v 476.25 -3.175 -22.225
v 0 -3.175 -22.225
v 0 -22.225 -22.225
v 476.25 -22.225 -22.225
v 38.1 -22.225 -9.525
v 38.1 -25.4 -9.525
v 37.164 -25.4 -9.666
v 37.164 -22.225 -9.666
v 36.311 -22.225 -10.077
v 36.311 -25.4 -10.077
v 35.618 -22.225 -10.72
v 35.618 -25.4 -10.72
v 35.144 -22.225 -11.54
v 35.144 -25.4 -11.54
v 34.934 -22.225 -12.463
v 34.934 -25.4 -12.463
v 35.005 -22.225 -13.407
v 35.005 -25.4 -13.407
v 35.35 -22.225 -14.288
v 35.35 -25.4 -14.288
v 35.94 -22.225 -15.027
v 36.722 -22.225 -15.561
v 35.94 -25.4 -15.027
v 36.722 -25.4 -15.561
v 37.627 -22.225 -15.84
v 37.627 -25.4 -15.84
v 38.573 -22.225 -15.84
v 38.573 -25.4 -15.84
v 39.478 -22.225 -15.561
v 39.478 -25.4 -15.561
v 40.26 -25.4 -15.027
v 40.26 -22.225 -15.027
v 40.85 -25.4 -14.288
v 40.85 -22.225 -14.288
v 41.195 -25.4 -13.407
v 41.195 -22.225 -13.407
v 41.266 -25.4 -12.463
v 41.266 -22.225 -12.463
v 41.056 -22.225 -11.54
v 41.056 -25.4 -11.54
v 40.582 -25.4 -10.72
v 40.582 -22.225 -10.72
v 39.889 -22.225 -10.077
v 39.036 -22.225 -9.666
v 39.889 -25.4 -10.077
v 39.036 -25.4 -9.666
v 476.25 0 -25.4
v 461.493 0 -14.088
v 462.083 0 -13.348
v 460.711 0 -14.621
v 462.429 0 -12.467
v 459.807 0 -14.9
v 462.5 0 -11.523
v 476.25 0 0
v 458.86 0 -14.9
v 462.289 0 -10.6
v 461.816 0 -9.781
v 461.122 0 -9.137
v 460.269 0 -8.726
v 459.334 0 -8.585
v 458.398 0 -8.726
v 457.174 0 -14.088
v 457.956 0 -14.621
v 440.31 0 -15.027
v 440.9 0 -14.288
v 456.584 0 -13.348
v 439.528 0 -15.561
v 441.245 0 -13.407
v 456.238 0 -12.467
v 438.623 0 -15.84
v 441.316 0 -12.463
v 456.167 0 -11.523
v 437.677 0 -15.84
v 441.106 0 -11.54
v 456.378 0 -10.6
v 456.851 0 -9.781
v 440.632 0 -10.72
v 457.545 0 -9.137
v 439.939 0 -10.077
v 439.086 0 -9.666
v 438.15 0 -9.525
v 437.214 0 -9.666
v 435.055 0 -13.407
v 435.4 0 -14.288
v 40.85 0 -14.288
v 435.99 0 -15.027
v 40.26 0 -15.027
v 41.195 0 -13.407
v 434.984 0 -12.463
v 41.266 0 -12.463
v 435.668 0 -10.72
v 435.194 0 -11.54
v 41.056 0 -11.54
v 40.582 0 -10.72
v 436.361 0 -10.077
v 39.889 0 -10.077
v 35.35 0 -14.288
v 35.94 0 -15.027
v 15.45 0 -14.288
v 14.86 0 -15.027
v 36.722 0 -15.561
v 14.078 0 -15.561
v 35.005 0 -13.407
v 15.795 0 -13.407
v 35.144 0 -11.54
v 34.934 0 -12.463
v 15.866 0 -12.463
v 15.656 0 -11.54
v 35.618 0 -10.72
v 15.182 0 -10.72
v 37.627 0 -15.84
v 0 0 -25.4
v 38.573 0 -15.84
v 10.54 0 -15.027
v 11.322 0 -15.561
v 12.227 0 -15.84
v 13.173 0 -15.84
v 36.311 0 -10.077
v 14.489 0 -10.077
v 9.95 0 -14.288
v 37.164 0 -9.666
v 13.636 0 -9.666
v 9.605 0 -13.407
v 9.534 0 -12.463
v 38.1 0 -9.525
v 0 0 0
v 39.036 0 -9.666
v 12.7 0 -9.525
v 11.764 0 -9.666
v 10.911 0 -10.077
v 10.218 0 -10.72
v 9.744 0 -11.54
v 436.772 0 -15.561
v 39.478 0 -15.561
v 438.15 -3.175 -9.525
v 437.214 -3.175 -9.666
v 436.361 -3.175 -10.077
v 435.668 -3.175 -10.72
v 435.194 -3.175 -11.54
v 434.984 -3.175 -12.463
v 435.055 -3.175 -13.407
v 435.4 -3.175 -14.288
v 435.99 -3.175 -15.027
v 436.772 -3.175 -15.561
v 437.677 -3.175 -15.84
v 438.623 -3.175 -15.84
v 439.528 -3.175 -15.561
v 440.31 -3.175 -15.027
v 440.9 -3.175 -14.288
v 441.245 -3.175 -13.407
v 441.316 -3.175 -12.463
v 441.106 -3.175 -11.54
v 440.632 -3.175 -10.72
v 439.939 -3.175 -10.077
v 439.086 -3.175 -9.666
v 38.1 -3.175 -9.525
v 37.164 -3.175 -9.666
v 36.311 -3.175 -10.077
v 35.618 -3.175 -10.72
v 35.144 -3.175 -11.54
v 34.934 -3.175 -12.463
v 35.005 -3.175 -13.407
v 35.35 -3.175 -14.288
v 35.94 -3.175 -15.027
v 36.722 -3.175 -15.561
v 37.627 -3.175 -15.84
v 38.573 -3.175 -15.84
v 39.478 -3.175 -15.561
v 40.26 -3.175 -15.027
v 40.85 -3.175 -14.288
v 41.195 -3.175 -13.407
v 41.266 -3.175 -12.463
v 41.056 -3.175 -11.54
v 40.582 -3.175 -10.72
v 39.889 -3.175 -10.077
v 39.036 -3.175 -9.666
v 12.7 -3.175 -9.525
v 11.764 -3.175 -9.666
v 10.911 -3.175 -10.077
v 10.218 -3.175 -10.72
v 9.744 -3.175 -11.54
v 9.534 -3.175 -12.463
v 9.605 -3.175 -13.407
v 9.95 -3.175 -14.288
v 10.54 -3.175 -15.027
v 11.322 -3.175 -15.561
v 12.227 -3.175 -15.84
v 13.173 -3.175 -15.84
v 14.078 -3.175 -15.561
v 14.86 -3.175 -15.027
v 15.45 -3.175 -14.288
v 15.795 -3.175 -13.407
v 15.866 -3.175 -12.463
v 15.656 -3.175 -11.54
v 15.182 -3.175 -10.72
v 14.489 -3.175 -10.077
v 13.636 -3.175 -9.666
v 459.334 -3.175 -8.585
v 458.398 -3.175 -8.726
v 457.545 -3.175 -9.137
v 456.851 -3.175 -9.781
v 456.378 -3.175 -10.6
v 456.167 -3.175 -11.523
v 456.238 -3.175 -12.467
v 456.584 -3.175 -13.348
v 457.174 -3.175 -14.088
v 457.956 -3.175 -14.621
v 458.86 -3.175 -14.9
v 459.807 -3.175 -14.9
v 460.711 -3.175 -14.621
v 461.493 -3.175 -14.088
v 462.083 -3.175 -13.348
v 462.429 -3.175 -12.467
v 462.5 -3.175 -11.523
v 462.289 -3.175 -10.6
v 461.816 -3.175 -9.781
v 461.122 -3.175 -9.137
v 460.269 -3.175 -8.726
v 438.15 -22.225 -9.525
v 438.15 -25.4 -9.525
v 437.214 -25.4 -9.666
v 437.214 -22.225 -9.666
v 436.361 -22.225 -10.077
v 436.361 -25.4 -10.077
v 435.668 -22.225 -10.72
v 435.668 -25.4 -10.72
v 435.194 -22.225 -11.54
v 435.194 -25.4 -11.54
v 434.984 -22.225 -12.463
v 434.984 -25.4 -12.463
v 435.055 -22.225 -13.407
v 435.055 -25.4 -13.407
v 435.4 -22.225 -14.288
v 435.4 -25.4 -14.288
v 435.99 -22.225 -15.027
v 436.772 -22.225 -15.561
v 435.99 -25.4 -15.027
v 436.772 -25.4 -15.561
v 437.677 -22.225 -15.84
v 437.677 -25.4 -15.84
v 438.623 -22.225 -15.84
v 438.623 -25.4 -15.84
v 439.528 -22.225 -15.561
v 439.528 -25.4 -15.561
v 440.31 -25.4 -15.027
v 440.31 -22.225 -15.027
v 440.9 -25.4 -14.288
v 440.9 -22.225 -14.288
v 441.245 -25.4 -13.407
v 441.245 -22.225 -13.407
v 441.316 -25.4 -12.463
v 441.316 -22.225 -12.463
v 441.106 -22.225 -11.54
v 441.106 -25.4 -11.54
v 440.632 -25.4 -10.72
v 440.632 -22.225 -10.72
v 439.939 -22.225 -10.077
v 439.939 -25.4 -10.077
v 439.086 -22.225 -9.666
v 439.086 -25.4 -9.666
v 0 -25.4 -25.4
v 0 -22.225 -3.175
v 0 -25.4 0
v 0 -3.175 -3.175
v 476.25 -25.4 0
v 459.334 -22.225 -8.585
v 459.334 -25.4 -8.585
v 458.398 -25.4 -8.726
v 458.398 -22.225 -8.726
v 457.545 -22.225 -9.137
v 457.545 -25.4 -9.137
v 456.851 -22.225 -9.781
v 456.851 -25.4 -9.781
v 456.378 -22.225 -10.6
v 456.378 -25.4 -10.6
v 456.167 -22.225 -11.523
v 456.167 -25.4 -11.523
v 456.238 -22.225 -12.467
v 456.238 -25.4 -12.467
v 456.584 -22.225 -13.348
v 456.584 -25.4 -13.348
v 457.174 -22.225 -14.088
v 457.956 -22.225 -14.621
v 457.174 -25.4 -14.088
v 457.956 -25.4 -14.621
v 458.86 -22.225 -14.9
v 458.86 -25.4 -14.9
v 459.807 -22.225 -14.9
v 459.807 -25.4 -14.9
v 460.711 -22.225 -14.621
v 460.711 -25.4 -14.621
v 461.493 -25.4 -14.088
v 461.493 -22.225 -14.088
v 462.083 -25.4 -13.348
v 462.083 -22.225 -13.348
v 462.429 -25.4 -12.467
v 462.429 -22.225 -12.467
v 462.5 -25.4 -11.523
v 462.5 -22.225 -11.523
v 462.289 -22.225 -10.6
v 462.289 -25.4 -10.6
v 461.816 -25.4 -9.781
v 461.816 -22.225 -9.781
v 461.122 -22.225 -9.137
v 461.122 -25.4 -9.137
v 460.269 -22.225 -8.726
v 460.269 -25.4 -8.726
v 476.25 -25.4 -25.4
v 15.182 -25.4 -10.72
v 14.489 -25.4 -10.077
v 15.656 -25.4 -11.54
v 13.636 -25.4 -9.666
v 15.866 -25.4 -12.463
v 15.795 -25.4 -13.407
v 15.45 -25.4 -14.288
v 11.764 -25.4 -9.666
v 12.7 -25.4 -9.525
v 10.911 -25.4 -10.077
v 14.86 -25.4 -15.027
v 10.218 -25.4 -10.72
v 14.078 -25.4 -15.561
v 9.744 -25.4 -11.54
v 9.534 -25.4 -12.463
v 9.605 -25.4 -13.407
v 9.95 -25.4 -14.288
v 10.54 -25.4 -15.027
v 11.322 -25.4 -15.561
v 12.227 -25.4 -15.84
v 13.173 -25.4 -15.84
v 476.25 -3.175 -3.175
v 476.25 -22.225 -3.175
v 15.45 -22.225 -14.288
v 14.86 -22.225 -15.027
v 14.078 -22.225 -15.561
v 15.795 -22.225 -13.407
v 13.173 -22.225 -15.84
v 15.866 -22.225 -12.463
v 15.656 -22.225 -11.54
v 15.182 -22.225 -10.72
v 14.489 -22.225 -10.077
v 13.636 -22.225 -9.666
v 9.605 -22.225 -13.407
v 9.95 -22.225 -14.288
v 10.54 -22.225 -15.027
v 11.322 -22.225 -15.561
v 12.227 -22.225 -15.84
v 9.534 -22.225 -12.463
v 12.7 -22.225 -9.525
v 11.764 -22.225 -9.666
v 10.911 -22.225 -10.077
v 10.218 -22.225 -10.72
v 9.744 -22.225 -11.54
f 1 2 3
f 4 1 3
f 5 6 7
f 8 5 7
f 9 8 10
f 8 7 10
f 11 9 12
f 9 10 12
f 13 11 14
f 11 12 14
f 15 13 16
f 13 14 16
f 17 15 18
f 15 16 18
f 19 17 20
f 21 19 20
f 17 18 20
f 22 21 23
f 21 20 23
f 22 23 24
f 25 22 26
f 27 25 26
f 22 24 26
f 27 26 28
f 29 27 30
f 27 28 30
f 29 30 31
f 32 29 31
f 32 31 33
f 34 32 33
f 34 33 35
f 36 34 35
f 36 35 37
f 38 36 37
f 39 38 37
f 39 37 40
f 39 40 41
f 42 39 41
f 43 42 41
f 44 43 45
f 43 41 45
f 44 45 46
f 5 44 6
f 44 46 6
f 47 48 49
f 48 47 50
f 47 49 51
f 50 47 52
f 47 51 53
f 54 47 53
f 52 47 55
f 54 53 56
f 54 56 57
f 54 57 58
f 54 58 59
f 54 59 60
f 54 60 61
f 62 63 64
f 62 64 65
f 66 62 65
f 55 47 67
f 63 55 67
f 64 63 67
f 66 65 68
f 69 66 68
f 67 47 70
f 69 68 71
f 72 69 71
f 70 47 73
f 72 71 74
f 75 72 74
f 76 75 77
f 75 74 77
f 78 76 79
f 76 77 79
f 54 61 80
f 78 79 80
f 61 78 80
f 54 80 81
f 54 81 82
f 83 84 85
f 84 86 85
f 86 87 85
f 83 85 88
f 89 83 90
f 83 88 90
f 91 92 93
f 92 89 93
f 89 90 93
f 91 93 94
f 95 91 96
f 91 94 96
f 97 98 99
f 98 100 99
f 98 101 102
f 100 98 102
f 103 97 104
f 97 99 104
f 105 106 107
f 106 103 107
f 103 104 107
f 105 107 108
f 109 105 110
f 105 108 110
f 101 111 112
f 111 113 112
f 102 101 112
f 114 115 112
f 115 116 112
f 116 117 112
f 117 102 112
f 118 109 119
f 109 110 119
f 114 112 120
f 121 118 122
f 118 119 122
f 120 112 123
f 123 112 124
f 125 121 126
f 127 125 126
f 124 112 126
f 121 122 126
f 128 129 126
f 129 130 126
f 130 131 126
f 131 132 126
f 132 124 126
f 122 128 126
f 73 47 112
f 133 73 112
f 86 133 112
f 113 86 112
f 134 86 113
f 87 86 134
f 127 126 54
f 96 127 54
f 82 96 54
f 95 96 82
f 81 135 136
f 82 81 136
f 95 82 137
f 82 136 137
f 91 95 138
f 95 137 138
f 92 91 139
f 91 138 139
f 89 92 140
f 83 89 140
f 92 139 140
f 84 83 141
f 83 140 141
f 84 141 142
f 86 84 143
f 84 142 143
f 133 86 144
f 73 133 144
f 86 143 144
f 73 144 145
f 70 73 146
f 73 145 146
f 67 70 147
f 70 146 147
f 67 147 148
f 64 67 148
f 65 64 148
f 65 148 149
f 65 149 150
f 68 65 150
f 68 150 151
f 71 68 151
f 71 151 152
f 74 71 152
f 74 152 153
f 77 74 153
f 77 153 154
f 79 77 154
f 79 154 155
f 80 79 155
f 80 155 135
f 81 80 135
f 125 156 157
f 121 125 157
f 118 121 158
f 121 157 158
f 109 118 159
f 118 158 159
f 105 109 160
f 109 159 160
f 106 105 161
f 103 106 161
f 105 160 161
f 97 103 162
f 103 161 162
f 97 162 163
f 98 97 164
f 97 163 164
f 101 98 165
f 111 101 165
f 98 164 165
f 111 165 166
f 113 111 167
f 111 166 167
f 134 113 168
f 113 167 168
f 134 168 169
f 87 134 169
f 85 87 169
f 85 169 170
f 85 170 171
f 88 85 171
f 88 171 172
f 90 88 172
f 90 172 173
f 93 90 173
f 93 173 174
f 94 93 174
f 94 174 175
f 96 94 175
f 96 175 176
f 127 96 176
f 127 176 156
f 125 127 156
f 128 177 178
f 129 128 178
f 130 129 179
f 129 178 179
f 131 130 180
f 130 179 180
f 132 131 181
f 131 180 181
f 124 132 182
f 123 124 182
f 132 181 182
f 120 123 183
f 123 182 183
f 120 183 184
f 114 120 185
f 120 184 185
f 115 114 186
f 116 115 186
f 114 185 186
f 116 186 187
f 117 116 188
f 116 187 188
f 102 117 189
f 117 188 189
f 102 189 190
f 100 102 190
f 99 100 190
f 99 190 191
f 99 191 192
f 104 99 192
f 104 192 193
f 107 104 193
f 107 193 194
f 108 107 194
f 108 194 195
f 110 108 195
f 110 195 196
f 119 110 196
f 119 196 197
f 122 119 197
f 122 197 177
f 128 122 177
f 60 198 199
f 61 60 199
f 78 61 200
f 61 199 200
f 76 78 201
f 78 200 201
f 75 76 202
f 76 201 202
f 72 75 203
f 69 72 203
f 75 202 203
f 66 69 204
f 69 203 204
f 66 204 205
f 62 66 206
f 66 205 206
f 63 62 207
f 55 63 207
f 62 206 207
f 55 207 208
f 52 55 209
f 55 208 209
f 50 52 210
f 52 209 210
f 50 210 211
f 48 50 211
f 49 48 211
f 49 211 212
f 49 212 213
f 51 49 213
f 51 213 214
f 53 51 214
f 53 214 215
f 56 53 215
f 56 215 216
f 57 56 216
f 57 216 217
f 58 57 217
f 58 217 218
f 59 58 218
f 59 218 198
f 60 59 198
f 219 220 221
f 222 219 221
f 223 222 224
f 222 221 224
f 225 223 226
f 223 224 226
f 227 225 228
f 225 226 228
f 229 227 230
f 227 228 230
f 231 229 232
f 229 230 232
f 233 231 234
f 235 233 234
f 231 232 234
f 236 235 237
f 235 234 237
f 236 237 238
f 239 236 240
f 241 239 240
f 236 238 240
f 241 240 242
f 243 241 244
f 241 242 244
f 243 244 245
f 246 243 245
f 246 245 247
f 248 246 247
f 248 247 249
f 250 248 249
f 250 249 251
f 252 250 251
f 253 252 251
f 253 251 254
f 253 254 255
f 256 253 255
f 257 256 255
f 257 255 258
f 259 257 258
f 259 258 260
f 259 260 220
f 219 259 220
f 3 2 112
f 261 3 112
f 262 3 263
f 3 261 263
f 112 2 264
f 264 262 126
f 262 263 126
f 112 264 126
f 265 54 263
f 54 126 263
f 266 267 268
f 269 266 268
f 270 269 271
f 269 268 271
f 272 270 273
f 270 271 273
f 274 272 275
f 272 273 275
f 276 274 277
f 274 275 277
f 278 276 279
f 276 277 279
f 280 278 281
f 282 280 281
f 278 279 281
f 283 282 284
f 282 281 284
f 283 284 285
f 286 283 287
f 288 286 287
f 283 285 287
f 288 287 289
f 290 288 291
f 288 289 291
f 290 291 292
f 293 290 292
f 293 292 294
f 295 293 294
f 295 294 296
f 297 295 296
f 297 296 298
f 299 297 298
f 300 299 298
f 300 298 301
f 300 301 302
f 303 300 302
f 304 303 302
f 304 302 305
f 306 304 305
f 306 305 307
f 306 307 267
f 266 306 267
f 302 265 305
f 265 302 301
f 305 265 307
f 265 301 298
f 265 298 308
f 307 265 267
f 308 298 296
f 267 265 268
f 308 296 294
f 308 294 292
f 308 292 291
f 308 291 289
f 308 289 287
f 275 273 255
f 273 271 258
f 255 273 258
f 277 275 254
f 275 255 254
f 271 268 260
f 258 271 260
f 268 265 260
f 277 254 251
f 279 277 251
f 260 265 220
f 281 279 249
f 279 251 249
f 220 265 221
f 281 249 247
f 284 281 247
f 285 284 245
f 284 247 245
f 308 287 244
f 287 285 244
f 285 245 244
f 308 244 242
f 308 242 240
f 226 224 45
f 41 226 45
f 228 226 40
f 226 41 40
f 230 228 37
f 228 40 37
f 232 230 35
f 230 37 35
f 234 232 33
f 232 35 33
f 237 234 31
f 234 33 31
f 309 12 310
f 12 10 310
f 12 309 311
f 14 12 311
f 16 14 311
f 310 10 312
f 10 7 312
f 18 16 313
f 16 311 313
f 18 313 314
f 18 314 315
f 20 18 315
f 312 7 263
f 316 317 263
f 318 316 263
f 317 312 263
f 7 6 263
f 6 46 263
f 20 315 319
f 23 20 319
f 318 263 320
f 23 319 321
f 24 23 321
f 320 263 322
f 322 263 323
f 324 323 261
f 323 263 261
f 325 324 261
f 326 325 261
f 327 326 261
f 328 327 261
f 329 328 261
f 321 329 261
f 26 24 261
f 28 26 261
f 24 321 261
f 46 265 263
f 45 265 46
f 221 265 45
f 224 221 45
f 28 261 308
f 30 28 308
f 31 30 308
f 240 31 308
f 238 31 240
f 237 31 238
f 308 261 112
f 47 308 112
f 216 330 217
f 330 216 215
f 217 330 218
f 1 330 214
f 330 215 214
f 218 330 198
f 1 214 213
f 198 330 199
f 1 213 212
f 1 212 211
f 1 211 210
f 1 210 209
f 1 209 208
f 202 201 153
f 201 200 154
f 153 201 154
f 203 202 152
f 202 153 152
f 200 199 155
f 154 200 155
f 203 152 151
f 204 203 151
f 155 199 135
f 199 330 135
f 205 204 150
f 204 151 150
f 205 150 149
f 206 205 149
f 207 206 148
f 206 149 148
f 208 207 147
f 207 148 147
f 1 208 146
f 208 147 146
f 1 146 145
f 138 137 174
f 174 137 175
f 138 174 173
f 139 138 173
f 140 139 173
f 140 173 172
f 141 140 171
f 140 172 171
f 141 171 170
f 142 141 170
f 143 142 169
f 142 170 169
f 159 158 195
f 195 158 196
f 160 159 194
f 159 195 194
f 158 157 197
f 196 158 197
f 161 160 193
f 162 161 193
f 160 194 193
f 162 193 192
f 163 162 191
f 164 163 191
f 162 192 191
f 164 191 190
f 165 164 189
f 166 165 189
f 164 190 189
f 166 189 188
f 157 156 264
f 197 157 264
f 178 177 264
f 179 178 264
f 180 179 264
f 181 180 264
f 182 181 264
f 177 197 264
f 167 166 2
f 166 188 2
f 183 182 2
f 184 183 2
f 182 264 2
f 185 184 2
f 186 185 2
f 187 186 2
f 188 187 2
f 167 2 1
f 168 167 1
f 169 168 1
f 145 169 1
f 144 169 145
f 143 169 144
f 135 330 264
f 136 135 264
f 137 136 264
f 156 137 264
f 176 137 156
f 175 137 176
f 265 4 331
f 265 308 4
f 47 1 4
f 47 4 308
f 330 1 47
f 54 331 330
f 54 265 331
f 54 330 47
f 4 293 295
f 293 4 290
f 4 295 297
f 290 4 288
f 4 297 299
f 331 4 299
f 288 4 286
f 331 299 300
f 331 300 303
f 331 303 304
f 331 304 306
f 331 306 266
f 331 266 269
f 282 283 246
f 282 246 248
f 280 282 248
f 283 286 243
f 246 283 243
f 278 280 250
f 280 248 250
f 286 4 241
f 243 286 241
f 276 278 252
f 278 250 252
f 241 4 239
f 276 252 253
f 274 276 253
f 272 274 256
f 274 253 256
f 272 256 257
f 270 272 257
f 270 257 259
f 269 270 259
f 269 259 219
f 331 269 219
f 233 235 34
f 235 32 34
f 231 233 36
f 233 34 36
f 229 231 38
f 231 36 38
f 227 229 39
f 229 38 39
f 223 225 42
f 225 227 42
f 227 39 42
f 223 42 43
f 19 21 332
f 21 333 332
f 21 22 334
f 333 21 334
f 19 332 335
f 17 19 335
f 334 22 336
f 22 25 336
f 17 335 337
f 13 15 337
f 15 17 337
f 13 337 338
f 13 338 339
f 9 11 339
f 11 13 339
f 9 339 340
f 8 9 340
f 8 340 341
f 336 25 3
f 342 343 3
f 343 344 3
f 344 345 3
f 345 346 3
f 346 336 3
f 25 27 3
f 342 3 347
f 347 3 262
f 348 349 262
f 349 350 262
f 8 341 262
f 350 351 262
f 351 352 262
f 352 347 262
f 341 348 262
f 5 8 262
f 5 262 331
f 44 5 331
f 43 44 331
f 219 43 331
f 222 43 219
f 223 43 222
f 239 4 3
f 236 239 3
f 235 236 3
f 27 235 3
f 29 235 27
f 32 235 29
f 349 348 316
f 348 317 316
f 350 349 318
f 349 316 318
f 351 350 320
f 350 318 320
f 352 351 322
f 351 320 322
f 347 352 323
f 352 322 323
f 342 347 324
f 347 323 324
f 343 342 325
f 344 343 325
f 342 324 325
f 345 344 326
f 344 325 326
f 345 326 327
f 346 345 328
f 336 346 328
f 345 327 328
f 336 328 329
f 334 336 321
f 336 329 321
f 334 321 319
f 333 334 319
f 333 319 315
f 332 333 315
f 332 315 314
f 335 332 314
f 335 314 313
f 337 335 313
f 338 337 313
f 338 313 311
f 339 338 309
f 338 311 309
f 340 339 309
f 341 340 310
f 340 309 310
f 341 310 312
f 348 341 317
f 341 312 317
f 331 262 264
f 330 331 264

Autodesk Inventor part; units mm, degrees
ref_plane "YZ Plane" through (0, 0, 0) normal (1, 0, 0) x (0, 1, 0)
ref_plane "XZ Plane" through (0, 0, 0) normal (0, 1, 0) x (-1, 0, 0)
ref_plane "XY Plane" through (0, 0, 0) normal (0, 0, 1) x (1, 0, 0)
sketch "Sketch1" plane through (0, 0, 0) normal (1, 0, 0) x (0, 1, 0)
  line L0 (0, 0) -> (-25.4, 0)
  line L1 (-25.4, 0) -> (-25.4, -25.4)
  line L2 (-25.4, -25.4) -> (0, -25.4)
  line L3 (0, -25.4) -> (0, 0)
  line L4 (-3.175, -22.225) -> (-22.225, -22.225)
  line L5 (-22.225, -22.225) -> (-22.225, -3.175)
  line L6 (-22.225, -3.175) -> (-3.175, -3.175)
  line L7 (-3.175, -3.175) -> (-3.175, -22.225)
  dimension "d0" = 25.4
  dimension "d1" = 25.4
  dimension "d2" = 3.175
extrude "Extrusion1" add sketch "Sketch1" along normal blind 476.25
sketch "Sketch2" plane through (0, 0, 0) normal (0, 1, 0) x (1, 0, 0)
  line L0 (0, 3.175) -> (0, 22.225) projected
  line L1 (0, 12.7) -> (476.25, 12.7) construction
  line L2 (0, 25.4) -> (476.25, 25.4) projected
  line L3 (476.25, 25.4) -> (476.25, 0) projected
  point P0 (0, 0)
  point P1 (438.15, 12.7)
  point P2 (12.7, 12.7)
  point P3 (38.1, 12.7)
  point P4 (459.3336, 11.7602)
  dimension "d6" = 12.7
  dimension "d7" = 12.7
  dimension "d8" = 38.1
  dimension "d9" = 38.1
  dimension "d10" = 16.9164
  dimension "d11" = 13.6398
hole "Hole1" at (438.15, 0, -12.7) at (12.7, 0, -12.7) at (38.1, 0, -12.7) at (459.3336, 0, -11.7602) direction (0, -1, 0) diameter 6.35 end through all
properties part number "15102898-16-P-0307" material "Aluminum 6061"
